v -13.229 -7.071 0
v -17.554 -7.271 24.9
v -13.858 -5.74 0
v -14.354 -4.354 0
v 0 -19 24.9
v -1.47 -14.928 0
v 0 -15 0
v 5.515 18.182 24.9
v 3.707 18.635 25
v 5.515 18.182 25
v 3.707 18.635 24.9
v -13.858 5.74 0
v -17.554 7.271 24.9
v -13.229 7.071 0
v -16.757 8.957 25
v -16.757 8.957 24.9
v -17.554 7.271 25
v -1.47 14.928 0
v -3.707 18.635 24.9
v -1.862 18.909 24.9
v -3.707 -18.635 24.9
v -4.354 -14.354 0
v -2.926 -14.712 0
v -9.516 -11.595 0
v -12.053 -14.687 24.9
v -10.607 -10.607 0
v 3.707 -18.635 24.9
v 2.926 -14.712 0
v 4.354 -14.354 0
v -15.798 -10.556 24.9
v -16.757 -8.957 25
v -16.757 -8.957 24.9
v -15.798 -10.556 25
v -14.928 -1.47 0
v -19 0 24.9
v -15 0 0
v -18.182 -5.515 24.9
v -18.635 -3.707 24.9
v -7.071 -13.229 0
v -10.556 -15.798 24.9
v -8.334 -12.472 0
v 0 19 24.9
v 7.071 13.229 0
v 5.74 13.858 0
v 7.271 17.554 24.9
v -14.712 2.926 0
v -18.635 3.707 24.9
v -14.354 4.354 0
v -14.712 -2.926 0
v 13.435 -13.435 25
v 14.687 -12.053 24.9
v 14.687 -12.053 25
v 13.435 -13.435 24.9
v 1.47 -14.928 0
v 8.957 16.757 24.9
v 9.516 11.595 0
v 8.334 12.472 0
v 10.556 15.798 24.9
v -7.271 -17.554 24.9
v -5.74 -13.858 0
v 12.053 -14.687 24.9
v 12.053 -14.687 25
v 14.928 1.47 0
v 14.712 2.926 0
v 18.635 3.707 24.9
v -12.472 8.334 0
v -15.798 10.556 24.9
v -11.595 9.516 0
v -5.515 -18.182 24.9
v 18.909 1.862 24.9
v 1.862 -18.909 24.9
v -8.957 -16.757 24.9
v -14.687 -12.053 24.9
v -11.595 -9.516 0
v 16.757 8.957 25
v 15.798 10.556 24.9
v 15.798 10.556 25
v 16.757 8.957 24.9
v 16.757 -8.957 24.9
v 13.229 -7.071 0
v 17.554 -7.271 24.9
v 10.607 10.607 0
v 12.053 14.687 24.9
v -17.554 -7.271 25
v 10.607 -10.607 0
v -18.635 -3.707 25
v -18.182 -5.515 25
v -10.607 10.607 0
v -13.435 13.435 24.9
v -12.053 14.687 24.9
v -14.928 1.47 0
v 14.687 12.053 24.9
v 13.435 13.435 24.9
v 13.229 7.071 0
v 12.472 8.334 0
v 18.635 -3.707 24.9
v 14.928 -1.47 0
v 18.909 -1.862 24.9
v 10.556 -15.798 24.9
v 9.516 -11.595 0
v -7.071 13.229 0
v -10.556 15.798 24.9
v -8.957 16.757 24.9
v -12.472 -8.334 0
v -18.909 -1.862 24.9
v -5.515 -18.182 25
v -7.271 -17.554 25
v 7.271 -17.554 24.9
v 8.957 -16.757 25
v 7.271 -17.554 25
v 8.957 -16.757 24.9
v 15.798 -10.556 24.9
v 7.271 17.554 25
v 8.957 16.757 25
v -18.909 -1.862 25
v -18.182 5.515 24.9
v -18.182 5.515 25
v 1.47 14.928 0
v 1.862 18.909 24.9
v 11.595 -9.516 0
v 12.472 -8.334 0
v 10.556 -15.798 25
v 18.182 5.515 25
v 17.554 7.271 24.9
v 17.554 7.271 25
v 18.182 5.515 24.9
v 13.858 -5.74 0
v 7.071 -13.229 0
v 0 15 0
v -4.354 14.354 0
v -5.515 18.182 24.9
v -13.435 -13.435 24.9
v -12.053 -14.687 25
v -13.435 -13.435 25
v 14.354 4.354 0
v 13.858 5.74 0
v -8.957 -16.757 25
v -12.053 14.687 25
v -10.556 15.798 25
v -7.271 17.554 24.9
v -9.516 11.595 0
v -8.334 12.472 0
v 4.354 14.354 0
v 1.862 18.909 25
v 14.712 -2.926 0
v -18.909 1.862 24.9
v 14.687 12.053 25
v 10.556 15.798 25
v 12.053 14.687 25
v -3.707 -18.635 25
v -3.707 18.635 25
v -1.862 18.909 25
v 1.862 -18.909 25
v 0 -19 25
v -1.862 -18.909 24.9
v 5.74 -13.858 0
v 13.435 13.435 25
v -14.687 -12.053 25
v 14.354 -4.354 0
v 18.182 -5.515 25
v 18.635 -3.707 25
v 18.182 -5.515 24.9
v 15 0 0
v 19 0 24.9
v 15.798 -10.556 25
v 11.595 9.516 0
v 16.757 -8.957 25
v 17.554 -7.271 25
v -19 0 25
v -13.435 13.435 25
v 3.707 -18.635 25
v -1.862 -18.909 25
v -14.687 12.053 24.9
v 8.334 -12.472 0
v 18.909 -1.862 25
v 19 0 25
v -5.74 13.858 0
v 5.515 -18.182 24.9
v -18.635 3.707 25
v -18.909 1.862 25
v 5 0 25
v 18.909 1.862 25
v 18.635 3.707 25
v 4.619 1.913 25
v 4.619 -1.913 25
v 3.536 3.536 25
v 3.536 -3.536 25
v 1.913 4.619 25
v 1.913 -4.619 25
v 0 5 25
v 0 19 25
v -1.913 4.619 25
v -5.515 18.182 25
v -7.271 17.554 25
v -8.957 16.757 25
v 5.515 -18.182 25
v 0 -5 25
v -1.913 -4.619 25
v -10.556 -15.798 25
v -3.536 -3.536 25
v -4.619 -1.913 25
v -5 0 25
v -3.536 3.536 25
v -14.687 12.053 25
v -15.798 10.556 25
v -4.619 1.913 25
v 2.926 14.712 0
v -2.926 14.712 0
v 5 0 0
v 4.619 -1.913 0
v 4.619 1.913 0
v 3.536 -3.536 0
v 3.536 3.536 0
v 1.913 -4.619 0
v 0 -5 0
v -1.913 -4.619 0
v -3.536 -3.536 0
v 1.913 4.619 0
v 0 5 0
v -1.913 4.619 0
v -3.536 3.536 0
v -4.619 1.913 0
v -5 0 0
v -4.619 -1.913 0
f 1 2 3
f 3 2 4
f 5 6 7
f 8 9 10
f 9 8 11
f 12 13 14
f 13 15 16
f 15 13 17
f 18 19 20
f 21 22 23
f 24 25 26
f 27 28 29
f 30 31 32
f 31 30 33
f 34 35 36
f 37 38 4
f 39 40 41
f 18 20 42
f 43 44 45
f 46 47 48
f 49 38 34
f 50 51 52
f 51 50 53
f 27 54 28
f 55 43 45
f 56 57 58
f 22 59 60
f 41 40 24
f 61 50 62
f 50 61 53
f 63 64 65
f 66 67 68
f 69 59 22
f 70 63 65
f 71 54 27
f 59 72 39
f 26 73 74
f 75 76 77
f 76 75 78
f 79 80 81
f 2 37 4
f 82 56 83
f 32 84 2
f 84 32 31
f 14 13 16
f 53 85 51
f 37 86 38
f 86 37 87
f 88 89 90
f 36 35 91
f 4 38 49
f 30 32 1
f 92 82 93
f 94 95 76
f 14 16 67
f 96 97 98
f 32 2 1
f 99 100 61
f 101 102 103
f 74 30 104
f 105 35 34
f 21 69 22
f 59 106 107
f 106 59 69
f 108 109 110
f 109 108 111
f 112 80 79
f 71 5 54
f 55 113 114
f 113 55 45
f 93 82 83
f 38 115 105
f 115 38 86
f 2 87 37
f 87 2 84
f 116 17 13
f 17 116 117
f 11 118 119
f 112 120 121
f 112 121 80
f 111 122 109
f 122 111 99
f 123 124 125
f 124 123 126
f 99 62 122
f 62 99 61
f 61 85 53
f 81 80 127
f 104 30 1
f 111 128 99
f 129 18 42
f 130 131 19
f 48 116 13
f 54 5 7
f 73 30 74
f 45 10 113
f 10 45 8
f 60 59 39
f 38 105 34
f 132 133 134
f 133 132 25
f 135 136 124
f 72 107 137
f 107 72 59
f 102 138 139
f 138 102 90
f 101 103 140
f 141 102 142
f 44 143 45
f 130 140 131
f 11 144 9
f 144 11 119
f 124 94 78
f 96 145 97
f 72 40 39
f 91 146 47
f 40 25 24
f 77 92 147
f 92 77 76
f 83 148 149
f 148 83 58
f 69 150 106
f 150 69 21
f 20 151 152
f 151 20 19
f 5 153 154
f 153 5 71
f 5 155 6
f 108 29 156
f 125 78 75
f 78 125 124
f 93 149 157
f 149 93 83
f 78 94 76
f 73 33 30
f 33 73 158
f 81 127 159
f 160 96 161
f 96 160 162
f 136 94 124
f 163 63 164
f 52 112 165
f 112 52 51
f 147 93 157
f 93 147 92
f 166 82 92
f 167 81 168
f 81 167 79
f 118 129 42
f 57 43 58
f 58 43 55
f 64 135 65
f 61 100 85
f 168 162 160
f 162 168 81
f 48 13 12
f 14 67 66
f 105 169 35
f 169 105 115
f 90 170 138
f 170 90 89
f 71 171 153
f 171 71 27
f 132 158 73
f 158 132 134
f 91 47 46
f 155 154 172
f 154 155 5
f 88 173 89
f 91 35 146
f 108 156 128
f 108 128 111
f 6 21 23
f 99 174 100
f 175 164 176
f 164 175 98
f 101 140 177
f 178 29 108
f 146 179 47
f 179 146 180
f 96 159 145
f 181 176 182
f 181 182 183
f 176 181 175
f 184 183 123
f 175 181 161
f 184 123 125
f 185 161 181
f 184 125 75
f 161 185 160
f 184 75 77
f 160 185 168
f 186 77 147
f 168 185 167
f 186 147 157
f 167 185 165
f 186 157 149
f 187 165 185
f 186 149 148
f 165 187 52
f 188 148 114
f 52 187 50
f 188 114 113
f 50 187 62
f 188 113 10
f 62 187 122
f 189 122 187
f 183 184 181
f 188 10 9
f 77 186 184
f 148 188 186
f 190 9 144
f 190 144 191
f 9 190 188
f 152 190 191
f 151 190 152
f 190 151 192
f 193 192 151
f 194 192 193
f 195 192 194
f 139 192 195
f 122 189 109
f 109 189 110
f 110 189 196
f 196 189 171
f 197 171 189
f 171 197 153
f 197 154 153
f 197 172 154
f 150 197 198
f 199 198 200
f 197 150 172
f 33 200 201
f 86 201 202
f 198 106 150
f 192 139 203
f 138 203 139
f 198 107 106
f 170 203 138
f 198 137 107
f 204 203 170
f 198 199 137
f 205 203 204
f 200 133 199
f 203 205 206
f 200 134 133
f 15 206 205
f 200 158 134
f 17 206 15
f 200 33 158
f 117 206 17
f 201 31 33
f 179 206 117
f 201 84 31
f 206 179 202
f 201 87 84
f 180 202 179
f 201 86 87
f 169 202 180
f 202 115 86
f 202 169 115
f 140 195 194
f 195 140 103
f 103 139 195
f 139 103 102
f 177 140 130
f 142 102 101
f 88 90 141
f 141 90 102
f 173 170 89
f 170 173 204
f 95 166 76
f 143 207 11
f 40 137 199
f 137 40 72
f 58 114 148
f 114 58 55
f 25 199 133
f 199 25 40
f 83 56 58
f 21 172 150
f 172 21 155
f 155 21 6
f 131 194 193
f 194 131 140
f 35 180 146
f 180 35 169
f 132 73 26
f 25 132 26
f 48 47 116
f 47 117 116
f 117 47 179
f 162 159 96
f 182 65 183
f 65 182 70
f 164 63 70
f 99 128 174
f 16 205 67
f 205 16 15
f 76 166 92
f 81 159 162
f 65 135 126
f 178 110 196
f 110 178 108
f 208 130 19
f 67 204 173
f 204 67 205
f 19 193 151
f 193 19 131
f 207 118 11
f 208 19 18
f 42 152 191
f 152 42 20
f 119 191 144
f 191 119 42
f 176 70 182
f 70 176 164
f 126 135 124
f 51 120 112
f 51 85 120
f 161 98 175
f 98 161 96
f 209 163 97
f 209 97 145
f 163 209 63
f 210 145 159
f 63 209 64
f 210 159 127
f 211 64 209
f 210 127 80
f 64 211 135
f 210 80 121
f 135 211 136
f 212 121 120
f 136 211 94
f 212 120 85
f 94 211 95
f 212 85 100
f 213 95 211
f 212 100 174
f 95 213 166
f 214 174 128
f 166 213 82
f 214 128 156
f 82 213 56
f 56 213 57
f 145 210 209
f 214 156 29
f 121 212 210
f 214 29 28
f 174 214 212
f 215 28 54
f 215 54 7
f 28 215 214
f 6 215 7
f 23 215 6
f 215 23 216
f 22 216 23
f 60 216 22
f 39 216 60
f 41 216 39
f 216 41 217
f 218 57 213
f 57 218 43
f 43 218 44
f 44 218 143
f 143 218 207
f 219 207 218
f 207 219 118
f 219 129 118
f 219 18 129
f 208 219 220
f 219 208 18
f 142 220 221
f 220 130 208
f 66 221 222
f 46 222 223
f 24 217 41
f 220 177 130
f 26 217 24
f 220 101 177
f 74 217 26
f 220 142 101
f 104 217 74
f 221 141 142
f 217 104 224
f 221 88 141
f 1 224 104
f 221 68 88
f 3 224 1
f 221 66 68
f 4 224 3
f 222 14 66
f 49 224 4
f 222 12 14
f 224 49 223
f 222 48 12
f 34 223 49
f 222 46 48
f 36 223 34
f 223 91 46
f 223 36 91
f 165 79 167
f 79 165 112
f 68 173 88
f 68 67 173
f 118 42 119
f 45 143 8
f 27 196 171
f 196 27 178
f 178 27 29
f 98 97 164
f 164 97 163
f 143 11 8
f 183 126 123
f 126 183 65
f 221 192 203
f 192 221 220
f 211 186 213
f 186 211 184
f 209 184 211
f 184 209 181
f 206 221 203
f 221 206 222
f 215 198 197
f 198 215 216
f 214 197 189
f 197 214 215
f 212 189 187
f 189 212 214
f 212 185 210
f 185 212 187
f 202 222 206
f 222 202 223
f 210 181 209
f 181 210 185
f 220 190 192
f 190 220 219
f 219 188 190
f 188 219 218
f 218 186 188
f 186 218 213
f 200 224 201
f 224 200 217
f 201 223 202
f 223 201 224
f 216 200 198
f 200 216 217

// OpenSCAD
//## Stopfen fuer Gaerspund

RadiusBottom = 15;
RadiusTop = 19;
Height = 25;

difference() {
    hull() {
        cylinder(r=RadiusBottom, h=0.1, $fn=64);
        translate([0, 0, Height-0.1])
            cylinder(r=RadiusTop, h=0.1, $fn=64);
    }
    cylinder(r=5, h=Height);
}
